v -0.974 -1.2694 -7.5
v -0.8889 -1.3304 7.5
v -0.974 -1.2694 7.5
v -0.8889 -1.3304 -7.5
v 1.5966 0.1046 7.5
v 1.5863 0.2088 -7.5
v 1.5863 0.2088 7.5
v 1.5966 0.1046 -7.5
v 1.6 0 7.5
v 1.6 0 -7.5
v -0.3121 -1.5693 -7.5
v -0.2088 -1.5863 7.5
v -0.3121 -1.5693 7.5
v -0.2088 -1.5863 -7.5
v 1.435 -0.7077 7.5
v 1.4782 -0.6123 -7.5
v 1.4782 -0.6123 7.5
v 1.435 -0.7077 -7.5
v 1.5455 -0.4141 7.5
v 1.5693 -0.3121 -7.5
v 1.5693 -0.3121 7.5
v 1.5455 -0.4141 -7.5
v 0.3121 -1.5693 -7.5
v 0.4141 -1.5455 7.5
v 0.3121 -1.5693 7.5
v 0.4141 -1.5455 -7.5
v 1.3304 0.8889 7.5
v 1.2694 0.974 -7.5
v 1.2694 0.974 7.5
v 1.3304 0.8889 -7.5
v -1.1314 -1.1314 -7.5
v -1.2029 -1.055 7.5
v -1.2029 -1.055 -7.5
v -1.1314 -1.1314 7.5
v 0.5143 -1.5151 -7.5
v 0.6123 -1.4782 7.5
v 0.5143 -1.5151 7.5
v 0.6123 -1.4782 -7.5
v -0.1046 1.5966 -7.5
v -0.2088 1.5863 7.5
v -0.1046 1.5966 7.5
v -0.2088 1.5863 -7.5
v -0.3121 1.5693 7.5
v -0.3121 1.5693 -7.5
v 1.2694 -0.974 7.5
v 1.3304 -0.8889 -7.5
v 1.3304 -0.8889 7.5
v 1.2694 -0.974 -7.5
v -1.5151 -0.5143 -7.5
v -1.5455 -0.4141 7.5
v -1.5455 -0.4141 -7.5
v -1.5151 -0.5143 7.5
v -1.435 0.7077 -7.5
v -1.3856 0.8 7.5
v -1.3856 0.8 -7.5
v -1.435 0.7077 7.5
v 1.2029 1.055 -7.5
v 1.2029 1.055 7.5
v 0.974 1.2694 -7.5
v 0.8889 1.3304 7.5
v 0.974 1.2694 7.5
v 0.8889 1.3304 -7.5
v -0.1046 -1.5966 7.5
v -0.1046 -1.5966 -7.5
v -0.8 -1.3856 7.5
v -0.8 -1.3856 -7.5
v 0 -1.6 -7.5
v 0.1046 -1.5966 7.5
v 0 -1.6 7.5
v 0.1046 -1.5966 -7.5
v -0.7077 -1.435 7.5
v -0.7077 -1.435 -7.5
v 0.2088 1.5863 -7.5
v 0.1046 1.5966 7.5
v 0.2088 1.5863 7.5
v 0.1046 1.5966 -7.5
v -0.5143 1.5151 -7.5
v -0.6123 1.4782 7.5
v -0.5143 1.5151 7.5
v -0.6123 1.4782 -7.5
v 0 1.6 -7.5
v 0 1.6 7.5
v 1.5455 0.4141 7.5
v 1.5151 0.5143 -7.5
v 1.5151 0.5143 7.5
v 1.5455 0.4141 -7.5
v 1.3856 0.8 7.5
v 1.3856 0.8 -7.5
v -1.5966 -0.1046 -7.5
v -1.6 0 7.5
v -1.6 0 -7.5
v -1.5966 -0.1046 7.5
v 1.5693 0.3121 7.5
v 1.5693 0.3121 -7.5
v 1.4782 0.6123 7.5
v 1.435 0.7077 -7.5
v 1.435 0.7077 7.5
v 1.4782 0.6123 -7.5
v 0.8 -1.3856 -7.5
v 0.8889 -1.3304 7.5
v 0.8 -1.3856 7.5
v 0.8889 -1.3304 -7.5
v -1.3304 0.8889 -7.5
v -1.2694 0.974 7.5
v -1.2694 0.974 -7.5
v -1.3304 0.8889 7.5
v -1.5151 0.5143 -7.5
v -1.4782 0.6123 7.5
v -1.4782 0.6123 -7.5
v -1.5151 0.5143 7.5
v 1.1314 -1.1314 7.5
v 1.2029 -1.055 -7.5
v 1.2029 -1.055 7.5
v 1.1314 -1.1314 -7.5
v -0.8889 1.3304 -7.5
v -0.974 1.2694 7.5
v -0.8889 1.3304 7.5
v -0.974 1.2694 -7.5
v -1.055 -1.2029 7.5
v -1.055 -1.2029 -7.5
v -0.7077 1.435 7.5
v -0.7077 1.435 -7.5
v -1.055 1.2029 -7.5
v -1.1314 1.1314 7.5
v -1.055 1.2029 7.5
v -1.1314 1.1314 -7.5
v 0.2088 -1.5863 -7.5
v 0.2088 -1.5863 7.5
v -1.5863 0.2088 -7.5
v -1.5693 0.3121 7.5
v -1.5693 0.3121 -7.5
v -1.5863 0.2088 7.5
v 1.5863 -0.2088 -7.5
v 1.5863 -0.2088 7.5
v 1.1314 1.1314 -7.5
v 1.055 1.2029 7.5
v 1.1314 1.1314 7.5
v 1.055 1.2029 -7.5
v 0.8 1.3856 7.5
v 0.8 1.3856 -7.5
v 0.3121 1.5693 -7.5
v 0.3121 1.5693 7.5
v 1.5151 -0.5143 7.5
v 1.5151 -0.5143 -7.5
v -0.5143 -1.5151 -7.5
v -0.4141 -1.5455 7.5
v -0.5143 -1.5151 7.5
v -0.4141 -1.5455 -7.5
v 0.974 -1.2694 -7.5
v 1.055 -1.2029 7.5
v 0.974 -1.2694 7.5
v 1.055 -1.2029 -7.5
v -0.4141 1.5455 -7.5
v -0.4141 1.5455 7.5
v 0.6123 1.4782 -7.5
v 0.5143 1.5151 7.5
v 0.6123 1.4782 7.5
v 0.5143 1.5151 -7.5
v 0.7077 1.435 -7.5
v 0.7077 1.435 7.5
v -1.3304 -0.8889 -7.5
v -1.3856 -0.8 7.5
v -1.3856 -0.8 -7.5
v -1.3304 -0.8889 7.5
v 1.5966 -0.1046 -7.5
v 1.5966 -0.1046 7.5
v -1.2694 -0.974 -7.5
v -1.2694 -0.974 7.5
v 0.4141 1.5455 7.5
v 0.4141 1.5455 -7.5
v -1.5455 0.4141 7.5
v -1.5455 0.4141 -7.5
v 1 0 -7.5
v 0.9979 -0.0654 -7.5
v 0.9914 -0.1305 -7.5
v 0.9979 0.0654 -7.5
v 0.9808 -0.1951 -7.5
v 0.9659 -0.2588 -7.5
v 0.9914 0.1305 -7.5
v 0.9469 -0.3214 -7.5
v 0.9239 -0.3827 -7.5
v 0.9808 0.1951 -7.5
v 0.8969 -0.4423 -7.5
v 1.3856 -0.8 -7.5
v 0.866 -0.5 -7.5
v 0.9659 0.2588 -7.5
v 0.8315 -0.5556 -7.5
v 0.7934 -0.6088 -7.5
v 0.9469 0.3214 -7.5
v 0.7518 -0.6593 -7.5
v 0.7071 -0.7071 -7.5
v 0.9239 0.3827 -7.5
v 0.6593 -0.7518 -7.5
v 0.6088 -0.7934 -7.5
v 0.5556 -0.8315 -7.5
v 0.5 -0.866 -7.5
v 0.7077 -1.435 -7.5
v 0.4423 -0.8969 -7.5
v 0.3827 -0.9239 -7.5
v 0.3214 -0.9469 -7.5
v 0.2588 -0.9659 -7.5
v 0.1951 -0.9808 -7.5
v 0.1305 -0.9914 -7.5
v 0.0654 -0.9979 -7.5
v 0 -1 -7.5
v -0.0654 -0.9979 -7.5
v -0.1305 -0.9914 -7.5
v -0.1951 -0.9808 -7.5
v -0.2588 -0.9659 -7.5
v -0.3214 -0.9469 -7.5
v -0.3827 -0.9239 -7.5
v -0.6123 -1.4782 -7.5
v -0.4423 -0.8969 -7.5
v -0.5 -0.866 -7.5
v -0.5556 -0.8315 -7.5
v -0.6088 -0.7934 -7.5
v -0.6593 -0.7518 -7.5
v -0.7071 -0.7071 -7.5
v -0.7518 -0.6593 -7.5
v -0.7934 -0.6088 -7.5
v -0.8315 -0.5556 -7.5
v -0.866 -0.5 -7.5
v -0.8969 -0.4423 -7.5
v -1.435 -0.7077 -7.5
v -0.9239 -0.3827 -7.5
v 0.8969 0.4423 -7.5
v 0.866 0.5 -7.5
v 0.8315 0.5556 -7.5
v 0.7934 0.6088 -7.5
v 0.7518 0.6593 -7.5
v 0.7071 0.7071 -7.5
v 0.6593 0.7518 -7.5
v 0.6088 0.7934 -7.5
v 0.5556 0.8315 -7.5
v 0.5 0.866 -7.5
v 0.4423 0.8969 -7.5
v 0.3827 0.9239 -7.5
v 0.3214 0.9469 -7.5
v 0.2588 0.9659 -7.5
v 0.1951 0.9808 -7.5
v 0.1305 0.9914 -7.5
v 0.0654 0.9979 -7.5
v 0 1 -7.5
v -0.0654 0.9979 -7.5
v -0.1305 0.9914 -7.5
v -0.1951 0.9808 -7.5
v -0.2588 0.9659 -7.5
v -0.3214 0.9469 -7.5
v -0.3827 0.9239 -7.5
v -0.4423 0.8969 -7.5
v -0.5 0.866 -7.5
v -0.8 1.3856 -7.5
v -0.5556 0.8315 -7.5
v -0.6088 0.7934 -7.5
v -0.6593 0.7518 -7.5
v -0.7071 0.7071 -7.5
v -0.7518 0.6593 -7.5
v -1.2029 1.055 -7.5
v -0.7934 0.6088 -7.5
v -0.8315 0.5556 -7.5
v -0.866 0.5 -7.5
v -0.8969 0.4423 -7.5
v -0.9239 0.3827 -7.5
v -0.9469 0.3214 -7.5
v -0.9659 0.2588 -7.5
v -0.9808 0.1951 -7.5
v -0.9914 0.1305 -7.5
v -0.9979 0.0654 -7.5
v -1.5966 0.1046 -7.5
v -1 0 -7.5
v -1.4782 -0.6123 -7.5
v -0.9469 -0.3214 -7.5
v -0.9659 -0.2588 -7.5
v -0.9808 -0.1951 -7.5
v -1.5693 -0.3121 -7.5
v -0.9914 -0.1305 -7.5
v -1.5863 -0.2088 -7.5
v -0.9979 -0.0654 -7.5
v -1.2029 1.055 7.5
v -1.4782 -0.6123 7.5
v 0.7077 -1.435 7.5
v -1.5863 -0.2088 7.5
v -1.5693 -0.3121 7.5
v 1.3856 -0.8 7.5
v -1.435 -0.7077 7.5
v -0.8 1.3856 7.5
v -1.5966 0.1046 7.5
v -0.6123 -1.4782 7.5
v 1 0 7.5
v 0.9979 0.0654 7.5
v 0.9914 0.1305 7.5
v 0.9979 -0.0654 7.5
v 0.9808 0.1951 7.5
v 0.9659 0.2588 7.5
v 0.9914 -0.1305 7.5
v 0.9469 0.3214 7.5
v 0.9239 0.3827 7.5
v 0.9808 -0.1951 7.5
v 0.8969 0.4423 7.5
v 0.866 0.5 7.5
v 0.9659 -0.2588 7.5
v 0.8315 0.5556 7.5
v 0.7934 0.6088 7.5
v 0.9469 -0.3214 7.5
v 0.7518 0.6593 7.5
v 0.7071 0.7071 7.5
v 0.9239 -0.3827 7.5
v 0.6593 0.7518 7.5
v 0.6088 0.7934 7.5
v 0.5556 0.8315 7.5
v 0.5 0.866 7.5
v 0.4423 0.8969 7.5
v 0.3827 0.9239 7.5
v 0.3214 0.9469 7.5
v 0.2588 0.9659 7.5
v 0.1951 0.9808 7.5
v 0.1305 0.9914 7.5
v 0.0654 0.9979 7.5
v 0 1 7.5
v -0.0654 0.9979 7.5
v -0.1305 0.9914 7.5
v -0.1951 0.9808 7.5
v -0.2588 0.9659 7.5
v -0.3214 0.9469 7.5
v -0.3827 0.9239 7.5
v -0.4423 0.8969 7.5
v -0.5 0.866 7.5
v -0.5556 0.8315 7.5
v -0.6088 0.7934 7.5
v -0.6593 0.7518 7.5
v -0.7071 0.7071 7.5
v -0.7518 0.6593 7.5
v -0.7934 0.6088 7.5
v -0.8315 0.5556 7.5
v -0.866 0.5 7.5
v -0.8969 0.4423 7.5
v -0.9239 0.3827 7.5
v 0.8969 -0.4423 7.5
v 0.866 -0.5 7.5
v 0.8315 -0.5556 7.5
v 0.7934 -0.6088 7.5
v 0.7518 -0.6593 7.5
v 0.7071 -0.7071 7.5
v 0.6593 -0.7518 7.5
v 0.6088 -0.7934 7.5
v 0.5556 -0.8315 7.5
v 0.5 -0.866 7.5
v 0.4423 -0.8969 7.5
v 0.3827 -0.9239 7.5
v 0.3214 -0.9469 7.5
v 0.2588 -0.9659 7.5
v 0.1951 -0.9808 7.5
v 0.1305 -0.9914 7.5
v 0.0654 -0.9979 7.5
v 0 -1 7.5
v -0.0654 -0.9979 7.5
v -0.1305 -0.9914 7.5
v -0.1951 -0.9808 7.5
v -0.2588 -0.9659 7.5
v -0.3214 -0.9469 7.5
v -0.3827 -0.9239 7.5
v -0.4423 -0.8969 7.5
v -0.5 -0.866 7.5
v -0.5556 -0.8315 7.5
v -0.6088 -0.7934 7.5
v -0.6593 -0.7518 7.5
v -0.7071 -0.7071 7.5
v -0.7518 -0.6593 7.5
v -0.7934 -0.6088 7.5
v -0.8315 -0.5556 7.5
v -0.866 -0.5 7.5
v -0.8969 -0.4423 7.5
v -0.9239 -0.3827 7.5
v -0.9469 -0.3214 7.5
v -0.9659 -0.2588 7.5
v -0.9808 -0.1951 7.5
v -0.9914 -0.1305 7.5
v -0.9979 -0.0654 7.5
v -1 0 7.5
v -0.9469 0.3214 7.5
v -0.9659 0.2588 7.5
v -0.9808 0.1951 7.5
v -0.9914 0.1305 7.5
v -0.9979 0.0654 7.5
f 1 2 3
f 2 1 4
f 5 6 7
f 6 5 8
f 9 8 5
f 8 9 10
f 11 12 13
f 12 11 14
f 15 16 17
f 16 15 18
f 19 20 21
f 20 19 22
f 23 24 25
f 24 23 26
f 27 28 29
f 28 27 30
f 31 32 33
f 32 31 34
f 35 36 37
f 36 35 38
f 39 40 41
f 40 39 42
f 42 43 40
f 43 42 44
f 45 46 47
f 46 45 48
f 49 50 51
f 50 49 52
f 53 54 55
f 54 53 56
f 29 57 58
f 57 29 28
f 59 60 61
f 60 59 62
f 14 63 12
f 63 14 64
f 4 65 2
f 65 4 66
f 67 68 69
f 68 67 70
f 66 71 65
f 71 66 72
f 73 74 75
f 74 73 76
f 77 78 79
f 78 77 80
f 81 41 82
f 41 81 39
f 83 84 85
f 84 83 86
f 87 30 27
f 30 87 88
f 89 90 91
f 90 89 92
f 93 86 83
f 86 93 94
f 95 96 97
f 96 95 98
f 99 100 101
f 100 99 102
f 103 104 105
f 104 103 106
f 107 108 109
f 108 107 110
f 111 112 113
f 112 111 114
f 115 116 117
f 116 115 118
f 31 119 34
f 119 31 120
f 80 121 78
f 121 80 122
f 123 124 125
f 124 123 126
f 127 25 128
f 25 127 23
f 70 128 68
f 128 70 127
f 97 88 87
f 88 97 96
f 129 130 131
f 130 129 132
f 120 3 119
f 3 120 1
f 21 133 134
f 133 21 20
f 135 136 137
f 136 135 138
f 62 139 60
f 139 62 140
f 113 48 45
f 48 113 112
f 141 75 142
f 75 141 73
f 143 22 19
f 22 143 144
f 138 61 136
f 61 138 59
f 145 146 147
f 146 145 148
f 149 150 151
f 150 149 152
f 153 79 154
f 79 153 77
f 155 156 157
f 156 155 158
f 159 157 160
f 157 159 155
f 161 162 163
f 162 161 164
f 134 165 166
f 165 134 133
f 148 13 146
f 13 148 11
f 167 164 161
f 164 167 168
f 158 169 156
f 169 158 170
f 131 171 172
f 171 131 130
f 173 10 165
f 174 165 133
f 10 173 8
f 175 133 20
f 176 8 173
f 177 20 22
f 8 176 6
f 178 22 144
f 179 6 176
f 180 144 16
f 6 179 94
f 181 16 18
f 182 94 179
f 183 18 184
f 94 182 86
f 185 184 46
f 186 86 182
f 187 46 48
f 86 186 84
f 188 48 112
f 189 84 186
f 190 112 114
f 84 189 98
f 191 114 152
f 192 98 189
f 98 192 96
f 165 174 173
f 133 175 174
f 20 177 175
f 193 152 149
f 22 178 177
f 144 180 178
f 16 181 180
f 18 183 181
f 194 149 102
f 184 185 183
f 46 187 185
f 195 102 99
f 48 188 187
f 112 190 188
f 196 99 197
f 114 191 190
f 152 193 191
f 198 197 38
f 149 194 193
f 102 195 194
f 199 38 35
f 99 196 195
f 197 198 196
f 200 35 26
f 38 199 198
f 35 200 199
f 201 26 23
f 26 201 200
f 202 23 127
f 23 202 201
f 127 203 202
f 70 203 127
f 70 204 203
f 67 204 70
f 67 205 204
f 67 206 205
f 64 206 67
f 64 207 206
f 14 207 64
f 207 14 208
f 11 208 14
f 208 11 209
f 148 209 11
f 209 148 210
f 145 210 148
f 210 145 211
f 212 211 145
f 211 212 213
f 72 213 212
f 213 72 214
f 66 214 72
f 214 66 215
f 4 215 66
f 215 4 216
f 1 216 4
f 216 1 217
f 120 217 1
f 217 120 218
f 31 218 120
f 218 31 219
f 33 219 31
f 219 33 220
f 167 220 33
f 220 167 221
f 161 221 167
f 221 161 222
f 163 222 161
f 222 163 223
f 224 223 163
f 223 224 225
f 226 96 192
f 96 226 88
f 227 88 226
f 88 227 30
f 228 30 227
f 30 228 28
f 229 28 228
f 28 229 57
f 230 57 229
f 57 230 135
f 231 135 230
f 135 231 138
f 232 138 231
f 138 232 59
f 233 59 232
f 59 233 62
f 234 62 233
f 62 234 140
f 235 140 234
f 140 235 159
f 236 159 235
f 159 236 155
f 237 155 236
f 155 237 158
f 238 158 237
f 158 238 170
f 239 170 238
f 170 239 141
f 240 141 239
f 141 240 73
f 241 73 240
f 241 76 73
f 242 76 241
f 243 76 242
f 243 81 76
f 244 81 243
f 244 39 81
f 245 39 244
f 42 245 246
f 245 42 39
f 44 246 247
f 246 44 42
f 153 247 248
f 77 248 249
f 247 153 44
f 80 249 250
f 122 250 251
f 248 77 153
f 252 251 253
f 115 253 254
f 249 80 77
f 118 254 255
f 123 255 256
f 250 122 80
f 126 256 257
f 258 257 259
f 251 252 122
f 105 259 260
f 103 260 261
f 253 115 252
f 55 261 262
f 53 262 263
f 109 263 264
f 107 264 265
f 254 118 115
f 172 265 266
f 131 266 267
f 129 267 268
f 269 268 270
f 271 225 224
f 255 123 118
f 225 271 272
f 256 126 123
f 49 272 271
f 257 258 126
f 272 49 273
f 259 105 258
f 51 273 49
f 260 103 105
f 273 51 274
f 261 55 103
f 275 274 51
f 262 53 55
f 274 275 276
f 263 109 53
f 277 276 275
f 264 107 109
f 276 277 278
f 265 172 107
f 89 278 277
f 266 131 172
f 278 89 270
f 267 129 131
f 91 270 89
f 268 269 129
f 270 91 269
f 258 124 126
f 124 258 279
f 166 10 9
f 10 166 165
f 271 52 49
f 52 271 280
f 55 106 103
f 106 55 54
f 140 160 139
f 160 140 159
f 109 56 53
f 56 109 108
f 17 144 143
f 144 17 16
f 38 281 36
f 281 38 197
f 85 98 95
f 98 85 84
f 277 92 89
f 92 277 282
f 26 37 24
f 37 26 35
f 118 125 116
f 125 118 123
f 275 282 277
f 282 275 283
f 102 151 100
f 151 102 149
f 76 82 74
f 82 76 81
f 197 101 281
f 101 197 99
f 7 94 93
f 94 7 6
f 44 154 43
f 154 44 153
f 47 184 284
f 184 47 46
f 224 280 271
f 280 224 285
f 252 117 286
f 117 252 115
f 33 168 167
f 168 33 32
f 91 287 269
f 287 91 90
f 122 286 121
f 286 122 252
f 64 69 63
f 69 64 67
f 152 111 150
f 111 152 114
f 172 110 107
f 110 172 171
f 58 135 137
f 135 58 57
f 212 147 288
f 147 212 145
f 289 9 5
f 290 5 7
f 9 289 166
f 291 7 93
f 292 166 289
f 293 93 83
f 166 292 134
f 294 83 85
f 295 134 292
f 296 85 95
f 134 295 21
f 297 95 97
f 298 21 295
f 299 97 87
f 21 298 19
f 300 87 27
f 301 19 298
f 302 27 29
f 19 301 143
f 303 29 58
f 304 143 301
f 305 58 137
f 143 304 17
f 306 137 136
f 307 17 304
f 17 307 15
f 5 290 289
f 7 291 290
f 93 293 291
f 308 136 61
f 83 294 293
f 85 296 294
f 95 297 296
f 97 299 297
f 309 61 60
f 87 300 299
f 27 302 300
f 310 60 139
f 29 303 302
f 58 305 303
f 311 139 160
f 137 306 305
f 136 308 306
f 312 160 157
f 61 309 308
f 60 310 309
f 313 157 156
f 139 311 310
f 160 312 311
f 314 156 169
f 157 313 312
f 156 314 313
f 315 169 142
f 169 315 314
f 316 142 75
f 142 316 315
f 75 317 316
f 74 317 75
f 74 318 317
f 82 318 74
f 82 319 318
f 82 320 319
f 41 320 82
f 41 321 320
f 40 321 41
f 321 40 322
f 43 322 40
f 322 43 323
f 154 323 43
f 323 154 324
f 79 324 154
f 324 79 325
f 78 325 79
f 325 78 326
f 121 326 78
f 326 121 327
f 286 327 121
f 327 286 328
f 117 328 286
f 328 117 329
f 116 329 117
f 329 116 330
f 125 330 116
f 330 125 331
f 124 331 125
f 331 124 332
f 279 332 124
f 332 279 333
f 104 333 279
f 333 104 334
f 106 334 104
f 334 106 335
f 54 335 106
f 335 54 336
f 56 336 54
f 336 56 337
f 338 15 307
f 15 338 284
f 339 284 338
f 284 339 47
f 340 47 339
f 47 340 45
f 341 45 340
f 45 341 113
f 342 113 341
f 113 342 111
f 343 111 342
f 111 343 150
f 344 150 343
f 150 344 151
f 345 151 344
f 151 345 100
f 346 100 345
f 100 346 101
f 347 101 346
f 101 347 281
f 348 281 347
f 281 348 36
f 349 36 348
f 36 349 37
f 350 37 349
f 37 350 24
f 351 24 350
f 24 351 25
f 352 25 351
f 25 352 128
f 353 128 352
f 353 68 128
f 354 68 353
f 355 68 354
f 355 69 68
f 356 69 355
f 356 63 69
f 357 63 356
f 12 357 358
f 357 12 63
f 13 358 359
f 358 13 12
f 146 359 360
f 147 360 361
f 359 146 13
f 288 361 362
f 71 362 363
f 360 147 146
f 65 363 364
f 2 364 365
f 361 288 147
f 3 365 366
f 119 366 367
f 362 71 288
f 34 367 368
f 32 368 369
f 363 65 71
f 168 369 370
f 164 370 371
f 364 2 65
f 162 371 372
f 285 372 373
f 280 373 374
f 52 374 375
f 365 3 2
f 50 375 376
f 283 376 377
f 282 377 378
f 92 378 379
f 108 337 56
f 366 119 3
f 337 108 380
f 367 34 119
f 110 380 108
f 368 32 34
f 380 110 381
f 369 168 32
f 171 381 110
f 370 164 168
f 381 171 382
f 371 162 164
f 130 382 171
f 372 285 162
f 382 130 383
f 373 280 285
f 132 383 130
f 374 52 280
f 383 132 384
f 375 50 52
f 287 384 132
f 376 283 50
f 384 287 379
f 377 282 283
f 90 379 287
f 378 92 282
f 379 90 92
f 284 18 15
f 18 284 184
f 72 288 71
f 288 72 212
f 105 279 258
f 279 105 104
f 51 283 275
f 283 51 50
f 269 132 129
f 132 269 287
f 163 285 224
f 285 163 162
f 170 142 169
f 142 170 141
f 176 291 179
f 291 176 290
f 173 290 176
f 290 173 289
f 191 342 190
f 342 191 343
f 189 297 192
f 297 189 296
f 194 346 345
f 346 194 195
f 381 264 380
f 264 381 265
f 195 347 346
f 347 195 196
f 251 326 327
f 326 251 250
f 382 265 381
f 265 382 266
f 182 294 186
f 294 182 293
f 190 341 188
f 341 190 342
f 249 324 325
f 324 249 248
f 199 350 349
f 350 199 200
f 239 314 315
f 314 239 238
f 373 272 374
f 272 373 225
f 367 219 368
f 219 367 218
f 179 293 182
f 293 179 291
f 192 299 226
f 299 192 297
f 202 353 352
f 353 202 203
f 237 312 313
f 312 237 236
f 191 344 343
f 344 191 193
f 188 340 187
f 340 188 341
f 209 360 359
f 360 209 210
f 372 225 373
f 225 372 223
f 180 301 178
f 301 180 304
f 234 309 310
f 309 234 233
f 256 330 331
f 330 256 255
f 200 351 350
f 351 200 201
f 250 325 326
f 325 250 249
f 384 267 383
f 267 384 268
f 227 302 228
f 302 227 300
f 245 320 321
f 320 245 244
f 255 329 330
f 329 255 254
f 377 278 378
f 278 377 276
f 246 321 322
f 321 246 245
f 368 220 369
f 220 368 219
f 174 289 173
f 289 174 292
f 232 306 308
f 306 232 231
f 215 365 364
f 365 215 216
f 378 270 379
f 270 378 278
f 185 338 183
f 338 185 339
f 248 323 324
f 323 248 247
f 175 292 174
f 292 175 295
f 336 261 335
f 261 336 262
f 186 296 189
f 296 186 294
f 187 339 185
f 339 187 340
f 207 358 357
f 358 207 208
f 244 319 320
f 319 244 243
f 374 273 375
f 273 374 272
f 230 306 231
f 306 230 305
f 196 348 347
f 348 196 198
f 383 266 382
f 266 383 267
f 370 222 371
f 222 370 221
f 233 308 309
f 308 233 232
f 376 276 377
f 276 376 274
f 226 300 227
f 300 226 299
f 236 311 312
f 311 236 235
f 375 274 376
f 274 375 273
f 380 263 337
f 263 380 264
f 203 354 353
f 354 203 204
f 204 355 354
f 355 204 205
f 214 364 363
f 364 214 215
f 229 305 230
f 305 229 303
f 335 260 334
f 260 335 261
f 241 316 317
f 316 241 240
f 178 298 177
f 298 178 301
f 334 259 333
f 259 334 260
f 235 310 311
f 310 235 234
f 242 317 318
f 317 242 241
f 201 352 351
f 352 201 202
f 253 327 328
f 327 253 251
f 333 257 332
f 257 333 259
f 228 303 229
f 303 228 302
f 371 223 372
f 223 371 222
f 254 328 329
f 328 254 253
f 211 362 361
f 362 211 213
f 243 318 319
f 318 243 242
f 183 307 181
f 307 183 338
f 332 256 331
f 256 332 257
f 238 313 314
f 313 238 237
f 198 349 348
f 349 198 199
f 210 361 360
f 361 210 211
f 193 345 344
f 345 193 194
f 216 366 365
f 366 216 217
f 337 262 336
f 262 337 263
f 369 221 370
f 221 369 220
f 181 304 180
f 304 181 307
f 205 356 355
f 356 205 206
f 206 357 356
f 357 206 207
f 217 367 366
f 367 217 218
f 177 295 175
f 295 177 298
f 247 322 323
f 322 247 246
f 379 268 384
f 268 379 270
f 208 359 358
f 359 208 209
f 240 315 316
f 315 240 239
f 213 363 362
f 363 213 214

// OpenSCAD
// Heatshrink sleeving / tubing (single connected solid)

// Parameters
length = 15; //[8:30:1]
center = true; //[0:1:1]
forced_id = 0; //[0:10:1]
type_selector = 1; //[1:3:1]
default_id_t1 = 2.0; //[1.0:4.0:0.1]
default_od_t1 = 3.2; //[1.6:6.4:0.1]
default_id_t2 = 3.0; //[1.5:6.0:0.1]
default_od_t2 = 4.8; //[2.4:9.6:0.1]
default_id_t3 = 4.0; //[2.0:8.0:0.1]
default_od_t3 = 6.4; //[3.2:12.8:0.1]
eps_overlap = 1.0; //[0.5:2.0:0.1]

// Resolution
$fn = 96;

// Derived dimensions
id_sel = (forced_id > 0) ? forced_id :
         (type_selector==1 ? default_id_t1 :
          (type_selector==2 ? default_id_t2 : default_id_t3));

od_sel = (type_selector==1 ? default_od_t1 :
          (type_selector==2 ? default_od_t2 : default_od_t3));

inner_r = id_sel/2;
outer_r = od_sel/2;

// Ensure valid wall thickness
min_wall = 0.25;
outer_r_safe = max(outer_r, inner_r + min_wall);

// One connected solid: a hollow cylindrical sleeve (heatshrink tubing)
module heatshrink_sleeve() {
  color([0.85, 0.85, 0.8])
  difference() {
    cylinder(r=outer_r_safe, h=length, center=center);
    cylinder(r=inner_r, h=length + 2*eps_overlap, center=center);
  }
}

heatshrink_sleeve();
